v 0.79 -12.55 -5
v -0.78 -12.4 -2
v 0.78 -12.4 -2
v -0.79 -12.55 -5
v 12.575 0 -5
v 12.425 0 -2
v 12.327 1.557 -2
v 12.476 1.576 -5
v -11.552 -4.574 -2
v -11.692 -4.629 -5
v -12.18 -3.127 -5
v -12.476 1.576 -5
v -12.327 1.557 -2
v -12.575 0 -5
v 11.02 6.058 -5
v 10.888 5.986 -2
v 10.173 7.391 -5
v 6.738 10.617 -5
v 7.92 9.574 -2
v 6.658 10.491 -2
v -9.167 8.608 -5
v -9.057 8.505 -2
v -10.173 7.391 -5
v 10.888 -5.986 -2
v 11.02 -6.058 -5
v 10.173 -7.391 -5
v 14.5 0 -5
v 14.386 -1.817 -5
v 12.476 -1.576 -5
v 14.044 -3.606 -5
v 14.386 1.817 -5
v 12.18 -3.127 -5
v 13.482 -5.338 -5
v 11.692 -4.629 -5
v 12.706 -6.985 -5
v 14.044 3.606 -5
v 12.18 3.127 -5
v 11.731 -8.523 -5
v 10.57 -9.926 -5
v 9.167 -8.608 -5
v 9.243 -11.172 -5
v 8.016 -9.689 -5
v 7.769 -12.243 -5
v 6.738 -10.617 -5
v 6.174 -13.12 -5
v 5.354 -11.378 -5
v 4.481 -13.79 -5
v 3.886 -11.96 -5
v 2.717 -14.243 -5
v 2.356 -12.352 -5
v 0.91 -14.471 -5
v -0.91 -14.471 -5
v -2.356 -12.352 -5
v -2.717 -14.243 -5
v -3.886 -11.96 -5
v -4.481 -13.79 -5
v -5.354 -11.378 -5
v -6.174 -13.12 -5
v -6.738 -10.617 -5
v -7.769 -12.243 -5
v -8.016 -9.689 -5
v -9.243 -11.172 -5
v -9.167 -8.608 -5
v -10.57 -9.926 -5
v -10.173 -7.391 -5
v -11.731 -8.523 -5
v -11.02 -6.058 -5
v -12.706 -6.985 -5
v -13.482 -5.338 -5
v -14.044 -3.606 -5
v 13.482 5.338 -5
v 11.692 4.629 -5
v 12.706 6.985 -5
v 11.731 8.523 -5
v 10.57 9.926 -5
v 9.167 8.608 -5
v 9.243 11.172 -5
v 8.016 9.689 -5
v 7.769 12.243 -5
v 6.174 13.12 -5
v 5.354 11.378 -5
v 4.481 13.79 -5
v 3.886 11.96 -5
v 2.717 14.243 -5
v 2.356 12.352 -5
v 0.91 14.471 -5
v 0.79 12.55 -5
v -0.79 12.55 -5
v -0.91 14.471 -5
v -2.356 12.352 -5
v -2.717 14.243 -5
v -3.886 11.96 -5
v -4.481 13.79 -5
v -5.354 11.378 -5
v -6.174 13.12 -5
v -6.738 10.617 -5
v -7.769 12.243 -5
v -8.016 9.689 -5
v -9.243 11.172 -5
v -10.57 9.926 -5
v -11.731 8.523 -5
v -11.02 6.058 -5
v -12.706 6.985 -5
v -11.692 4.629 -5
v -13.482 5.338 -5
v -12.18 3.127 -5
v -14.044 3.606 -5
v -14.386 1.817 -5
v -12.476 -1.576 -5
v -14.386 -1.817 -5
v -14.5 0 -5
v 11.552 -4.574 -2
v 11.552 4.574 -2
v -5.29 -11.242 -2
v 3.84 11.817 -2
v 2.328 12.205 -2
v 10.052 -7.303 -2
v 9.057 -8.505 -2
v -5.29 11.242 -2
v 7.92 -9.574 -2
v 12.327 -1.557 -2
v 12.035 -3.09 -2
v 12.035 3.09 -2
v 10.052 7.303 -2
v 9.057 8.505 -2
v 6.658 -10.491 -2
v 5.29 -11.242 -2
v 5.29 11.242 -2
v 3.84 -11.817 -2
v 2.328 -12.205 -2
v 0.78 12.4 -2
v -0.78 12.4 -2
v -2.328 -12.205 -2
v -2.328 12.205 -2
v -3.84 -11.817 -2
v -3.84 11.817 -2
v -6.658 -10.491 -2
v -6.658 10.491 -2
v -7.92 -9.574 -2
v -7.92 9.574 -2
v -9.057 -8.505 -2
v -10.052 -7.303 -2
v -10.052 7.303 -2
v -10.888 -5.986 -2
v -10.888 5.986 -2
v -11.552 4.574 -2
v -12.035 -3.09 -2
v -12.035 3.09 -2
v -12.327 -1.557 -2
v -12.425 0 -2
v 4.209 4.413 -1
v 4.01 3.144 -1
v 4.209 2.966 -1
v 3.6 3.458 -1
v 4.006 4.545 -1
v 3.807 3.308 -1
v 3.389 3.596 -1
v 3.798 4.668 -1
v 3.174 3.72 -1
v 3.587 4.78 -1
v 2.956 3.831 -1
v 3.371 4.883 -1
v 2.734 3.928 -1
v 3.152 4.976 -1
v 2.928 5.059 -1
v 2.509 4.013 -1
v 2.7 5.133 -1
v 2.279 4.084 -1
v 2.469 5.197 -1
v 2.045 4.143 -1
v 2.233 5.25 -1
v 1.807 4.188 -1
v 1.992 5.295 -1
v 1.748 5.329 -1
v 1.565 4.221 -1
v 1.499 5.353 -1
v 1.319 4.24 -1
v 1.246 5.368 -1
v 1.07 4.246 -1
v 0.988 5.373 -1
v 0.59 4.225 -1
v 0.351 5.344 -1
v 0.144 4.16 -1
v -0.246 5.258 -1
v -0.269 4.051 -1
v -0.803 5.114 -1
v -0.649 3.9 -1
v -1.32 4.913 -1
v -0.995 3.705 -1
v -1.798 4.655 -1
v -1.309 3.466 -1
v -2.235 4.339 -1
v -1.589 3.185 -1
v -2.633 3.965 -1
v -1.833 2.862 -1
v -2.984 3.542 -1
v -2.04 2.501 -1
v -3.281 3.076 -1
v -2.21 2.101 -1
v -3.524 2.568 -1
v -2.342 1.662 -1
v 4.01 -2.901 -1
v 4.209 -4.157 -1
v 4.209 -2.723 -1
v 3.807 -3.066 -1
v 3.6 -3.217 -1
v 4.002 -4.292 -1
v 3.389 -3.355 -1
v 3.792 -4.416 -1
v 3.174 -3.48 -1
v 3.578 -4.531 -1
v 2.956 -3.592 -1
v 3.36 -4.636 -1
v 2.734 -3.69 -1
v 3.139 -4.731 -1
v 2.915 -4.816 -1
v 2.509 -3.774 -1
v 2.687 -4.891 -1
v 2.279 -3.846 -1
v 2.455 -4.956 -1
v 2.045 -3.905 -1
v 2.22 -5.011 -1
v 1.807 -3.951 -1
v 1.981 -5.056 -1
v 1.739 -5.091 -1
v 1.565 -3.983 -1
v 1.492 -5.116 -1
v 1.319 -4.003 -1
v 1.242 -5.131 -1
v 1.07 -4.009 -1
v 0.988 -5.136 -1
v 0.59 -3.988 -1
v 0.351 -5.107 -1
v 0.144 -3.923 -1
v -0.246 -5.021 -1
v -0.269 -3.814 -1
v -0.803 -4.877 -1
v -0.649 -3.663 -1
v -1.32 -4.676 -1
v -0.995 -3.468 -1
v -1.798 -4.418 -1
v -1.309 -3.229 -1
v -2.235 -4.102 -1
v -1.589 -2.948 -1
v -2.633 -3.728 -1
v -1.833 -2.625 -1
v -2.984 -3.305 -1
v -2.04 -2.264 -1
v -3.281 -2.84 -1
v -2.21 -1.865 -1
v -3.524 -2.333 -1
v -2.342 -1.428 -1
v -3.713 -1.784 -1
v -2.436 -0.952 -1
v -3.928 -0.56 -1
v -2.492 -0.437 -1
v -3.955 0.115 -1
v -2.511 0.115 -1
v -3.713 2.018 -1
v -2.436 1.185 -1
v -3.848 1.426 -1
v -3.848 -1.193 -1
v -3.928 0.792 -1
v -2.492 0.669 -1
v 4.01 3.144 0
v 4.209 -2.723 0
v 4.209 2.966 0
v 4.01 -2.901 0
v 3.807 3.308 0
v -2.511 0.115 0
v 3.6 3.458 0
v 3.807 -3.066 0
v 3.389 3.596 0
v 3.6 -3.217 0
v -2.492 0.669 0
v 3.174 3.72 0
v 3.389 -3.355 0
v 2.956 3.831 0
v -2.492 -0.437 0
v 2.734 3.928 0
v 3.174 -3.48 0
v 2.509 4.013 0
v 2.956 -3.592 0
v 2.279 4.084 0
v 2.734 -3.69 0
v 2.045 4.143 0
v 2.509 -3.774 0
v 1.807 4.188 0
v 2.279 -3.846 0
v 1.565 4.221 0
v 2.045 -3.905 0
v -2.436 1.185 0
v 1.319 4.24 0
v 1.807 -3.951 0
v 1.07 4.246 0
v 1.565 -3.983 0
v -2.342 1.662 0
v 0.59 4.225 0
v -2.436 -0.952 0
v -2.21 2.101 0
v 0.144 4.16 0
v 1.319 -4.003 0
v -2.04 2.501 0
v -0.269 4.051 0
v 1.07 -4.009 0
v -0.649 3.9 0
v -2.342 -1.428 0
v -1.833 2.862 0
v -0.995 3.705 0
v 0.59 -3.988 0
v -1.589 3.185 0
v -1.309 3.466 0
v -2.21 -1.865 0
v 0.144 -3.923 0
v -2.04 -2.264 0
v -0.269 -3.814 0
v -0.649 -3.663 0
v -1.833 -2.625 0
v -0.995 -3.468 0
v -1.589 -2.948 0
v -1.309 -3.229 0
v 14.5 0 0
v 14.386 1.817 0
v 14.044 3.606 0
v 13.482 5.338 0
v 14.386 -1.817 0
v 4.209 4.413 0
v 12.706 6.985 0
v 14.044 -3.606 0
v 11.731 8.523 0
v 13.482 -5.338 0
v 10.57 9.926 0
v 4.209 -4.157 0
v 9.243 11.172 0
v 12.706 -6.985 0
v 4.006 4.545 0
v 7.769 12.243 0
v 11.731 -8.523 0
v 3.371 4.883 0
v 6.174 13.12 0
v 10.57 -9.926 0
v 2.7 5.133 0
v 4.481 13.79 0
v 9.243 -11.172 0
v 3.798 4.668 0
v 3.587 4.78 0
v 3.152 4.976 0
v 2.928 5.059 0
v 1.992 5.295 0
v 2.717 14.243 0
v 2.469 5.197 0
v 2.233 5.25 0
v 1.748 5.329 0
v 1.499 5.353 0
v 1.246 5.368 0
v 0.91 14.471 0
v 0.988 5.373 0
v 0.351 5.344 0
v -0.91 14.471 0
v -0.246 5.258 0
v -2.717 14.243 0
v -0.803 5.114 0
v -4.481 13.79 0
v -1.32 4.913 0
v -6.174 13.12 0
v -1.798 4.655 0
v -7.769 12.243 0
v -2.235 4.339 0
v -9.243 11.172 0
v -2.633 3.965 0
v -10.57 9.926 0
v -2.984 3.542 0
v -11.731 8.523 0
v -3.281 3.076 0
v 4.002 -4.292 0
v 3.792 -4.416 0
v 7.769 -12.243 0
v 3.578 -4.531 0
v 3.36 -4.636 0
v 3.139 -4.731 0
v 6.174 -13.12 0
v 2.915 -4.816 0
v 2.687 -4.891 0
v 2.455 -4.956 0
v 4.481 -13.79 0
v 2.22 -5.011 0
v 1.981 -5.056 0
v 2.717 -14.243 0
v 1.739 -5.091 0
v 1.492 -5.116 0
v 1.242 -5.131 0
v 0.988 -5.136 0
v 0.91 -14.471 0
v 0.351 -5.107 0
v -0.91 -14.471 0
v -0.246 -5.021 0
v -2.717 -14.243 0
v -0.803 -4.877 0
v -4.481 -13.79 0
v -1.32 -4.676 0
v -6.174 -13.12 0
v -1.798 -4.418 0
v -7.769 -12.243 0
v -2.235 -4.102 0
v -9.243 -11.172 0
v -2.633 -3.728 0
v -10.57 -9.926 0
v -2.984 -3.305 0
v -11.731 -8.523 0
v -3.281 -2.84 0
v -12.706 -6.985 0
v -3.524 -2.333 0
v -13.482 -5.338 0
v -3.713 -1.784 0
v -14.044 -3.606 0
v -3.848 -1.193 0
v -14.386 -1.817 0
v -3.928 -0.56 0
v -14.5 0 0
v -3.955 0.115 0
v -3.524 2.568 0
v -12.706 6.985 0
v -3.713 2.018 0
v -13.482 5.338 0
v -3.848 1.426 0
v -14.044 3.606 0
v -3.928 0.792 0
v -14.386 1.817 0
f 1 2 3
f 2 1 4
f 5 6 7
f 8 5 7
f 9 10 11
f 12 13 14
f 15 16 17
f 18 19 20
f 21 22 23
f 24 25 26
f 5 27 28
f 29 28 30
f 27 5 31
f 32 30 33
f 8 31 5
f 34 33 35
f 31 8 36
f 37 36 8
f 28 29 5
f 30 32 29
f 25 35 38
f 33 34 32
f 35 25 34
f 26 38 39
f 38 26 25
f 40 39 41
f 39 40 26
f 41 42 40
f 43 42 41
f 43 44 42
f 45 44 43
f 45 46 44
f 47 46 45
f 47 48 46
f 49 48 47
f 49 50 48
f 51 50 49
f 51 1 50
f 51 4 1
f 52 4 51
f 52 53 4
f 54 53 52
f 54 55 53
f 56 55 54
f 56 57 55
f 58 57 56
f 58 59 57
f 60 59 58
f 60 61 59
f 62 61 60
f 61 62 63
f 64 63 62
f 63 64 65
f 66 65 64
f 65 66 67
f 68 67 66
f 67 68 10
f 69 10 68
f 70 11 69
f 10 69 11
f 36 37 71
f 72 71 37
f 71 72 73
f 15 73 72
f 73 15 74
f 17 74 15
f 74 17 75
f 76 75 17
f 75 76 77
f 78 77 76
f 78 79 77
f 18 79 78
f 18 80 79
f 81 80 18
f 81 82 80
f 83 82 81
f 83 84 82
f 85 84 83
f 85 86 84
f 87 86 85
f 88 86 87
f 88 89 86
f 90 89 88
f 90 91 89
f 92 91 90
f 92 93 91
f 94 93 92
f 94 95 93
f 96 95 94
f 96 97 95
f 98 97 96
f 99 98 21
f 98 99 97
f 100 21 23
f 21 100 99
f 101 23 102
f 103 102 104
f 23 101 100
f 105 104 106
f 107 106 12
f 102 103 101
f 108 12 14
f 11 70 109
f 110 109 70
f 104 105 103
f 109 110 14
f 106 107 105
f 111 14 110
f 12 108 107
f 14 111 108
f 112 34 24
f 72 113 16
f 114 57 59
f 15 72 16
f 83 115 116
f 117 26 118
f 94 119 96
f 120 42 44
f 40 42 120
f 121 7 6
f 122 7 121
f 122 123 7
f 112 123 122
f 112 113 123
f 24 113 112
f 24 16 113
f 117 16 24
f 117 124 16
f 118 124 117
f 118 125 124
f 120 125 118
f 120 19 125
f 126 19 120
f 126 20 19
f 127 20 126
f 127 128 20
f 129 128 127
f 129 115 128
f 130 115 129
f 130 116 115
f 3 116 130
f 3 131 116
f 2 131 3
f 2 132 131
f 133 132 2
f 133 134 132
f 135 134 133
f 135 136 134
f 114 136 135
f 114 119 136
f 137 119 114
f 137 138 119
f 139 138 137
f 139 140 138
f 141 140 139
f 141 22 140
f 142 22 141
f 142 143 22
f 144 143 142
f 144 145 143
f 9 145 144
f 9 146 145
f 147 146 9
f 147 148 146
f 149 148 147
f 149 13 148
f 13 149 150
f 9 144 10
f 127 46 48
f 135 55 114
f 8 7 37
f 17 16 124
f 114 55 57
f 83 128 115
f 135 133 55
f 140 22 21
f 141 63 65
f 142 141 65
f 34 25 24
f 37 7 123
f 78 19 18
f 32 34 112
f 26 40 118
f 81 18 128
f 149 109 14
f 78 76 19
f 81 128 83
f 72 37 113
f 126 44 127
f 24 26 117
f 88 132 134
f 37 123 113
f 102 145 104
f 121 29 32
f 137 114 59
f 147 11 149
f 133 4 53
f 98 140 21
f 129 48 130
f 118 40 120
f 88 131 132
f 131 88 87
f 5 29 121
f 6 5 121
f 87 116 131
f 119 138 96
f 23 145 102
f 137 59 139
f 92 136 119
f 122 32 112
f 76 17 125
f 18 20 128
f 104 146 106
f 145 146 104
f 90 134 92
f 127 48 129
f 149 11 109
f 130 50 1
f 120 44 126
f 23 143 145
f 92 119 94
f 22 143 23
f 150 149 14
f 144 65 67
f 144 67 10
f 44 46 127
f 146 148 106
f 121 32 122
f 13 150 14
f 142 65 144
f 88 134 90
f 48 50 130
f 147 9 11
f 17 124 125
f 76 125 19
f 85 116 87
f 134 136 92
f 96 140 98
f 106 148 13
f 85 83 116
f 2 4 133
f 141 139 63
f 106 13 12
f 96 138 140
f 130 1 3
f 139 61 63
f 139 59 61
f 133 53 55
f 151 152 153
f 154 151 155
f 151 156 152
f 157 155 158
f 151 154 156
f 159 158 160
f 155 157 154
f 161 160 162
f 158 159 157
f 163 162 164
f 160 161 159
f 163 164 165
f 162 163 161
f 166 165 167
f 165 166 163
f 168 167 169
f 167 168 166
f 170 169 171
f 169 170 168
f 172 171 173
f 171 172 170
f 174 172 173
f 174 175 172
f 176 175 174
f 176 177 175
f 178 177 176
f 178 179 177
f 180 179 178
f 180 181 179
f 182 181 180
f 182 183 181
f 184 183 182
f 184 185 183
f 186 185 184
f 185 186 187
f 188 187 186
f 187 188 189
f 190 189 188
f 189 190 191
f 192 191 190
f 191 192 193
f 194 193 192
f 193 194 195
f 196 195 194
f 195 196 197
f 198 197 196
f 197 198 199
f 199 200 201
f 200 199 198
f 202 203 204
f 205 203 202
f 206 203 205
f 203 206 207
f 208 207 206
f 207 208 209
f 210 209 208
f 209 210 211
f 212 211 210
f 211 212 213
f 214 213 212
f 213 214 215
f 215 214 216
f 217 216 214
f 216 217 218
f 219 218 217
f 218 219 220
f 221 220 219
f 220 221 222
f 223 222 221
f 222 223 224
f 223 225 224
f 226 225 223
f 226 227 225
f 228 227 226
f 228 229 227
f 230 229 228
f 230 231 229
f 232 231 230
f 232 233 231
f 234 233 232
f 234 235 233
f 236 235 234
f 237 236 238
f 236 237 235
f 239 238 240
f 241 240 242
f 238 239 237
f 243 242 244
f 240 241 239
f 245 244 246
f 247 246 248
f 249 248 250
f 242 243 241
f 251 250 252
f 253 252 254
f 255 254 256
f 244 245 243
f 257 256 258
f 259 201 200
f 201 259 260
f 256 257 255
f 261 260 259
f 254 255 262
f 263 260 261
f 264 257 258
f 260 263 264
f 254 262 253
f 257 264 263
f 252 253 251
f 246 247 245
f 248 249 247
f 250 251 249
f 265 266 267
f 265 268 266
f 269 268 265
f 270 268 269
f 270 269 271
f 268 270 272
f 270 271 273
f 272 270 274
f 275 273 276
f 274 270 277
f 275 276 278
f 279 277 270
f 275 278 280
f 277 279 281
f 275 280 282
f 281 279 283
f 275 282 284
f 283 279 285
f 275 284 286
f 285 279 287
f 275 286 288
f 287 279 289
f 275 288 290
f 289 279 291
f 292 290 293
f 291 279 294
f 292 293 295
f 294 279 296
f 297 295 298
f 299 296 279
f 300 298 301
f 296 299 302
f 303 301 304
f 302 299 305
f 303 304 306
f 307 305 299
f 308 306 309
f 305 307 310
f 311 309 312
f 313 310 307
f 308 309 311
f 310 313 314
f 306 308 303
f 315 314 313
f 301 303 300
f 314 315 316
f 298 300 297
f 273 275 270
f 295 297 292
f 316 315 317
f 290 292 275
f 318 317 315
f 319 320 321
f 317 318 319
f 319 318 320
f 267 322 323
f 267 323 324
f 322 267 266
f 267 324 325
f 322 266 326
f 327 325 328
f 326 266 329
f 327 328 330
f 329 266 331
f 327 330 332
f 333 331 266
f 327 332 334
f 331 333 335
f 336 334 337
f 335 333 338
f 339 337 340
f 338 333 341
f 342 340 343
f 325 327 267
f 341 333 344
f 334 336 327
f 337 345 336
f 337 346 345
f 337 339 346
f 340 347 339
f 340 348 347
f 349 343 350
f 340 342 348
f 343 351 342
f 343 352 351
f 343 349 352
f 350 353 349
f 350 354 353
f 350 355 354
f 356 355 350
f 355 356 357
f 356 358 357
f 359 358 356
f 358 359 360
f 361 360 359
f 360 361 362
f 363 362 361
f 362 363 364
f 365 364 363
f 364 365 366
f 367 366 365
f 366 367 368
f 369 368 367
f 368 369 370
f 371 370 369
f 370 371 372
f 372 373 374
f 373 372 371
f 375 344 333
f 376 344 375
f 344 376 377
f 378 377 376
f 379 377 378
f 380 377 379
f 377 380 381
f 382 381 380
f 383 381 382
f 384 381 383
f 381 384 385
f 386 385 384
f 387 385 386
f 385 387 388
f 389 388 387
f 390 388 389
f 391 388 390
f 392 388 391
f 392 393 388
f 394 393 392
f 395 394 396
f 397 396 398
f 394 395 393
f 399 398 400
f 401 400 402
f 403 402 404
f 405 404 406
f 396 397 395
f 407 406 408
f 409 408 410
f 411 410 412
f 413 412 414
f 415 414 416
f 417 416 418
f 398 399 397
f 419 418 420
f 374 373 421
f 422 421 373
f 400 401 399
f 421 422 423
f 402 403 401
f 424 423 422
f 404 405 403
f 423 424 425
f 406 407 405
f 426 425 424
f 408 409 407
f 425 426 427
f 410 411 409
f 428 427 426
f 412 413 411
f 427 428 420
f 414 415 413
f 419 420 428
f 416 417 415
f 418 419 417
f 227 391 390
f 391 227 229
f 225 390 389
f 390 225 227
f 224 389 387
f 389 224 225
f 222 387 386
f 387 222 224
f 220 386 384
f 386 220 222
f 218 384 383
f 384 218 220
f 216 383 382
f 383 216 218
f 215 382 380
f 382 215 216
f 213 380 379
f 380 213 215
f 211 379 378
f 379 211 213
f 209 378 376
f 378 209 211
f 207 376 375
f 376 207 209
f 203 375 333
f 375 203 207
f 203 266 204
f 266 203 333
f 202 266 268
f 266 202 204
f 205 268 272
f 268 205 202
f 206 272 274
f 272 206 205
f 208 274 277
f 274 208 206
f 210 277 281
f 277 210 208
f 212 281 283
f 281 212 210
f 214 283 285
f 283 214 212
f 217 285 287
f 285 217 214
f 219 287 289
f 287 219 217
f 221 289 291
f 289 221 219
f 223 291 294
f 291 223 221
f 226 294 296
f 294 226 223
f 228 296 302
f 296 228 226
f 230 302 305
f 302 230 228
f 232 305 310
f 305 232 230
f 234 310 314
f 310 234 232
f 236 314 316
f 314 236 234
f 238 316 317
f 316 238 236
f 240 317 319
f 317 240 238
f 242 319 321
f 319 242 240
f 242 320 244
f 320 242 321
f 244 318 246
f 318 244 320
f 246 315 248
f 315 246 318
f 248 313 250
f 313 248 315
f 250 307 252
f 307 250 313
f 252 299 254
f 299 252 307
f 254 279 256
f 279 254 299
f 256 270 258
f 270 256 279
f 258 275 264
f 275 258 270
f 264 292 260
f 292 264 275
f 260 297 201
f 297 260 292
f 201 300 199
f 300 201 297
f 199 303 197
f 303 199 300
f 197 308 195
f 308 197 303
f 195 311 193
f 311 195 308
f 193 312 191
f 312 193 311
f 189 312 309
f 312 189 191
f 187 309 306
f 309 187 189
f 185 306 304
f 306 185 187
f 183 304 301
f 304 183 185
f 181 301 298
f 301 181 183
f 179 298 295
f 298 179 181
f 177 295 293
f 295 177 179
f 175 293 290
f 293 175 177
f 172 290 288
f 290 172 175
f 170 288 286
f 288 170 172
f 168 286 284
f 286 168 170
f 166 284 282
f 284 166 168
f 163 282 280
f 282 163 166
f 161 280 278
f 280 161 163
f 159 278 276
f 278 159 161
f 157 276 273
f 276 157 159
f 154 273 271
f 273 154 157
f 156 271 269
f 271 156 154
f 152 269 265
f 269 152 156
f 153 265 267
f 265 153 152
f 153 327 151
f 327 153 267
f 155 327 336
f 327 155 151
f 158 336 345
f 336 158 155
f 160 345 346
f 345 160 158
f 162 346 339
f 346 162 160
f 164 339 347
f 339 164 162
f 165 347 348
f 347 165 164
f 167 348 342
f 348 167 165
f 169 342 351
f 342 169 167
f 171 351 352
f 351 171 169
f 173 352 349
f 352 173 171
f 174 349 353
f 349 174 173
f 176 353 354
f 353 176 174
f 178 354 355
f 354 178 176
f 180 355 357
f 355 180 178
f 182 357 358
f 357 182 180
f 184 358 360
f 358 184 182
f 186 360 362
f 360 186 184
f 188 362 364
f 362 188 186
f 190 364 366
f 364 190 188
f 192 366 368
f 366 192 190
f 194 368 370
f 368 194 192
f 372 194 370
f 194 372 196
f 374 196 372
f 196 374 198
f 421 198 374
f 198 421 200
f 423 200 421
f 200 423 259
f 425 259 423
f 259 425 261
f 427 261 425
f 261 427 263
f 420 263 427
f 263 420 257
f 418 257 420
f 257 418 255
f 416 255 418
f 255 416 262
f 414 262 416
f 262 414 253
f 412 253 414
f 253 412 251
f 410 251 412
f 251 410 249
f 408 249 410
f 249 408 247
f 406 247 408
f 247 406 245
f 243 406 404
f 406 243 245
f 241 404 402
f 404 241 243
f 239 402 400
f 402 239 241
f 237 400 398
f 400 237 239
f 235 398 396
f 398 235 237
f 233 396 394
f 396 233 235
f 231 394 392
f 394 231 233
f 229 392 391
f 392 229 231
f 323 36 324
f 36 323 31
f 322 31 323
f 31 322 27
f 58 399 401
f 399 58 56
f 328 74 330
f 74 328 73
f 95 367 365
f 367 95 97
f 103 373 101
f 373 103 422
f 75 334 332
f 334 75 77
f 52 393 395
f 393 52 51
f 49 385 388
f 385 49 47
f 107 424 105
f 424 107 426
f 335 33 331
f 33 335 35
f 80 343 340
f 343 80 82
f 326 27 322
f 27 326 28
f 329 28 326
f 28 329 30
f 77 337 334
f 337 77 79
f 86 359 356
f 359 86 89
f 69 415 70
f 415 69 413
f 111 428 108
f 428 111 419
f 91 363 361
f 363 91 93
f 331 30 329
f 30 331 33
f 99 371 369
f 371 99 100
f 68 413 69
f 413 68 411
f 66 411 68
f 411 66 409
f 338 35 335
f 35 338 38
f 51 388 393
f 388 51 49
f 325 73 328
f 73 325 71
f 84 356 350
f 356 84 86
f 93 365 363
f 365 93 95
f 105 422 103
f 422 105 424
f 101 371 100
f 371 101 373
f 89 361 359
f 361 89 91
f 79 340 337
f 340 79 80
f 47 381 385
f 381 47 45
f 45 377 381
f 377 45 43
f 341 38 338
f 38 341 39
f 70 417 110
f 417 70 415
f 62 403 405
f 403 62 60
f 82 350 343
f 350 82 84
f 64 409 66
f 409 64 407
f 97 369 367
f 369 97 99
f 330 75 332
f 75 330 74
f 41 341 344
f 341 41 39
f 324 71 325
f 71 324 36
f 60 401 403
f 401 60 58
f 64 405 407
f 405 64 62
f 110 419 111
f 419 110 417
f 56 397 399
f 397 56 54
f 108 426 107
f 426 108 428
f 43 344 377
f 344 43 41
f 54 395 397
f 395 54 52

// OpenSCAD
$fn = 50;

difference() {
	union() {
		translate(v = [0, 0, -5.0]) {
			cylinder(h = 5, r = 14.5);
		}
	}
	union() {
		#translate(v = [0, 0, -5.0]) {
			cylinder(h = 3, r1 = 12.575, r2 = 12.425);
		}
		translate(v = [0, 0, -1]) {
			linear_extrude(height = 1) {
				text(font = "Impact", halign = "center", size = 10, text = "C", valign = "center");
			}
		}
	}
}
